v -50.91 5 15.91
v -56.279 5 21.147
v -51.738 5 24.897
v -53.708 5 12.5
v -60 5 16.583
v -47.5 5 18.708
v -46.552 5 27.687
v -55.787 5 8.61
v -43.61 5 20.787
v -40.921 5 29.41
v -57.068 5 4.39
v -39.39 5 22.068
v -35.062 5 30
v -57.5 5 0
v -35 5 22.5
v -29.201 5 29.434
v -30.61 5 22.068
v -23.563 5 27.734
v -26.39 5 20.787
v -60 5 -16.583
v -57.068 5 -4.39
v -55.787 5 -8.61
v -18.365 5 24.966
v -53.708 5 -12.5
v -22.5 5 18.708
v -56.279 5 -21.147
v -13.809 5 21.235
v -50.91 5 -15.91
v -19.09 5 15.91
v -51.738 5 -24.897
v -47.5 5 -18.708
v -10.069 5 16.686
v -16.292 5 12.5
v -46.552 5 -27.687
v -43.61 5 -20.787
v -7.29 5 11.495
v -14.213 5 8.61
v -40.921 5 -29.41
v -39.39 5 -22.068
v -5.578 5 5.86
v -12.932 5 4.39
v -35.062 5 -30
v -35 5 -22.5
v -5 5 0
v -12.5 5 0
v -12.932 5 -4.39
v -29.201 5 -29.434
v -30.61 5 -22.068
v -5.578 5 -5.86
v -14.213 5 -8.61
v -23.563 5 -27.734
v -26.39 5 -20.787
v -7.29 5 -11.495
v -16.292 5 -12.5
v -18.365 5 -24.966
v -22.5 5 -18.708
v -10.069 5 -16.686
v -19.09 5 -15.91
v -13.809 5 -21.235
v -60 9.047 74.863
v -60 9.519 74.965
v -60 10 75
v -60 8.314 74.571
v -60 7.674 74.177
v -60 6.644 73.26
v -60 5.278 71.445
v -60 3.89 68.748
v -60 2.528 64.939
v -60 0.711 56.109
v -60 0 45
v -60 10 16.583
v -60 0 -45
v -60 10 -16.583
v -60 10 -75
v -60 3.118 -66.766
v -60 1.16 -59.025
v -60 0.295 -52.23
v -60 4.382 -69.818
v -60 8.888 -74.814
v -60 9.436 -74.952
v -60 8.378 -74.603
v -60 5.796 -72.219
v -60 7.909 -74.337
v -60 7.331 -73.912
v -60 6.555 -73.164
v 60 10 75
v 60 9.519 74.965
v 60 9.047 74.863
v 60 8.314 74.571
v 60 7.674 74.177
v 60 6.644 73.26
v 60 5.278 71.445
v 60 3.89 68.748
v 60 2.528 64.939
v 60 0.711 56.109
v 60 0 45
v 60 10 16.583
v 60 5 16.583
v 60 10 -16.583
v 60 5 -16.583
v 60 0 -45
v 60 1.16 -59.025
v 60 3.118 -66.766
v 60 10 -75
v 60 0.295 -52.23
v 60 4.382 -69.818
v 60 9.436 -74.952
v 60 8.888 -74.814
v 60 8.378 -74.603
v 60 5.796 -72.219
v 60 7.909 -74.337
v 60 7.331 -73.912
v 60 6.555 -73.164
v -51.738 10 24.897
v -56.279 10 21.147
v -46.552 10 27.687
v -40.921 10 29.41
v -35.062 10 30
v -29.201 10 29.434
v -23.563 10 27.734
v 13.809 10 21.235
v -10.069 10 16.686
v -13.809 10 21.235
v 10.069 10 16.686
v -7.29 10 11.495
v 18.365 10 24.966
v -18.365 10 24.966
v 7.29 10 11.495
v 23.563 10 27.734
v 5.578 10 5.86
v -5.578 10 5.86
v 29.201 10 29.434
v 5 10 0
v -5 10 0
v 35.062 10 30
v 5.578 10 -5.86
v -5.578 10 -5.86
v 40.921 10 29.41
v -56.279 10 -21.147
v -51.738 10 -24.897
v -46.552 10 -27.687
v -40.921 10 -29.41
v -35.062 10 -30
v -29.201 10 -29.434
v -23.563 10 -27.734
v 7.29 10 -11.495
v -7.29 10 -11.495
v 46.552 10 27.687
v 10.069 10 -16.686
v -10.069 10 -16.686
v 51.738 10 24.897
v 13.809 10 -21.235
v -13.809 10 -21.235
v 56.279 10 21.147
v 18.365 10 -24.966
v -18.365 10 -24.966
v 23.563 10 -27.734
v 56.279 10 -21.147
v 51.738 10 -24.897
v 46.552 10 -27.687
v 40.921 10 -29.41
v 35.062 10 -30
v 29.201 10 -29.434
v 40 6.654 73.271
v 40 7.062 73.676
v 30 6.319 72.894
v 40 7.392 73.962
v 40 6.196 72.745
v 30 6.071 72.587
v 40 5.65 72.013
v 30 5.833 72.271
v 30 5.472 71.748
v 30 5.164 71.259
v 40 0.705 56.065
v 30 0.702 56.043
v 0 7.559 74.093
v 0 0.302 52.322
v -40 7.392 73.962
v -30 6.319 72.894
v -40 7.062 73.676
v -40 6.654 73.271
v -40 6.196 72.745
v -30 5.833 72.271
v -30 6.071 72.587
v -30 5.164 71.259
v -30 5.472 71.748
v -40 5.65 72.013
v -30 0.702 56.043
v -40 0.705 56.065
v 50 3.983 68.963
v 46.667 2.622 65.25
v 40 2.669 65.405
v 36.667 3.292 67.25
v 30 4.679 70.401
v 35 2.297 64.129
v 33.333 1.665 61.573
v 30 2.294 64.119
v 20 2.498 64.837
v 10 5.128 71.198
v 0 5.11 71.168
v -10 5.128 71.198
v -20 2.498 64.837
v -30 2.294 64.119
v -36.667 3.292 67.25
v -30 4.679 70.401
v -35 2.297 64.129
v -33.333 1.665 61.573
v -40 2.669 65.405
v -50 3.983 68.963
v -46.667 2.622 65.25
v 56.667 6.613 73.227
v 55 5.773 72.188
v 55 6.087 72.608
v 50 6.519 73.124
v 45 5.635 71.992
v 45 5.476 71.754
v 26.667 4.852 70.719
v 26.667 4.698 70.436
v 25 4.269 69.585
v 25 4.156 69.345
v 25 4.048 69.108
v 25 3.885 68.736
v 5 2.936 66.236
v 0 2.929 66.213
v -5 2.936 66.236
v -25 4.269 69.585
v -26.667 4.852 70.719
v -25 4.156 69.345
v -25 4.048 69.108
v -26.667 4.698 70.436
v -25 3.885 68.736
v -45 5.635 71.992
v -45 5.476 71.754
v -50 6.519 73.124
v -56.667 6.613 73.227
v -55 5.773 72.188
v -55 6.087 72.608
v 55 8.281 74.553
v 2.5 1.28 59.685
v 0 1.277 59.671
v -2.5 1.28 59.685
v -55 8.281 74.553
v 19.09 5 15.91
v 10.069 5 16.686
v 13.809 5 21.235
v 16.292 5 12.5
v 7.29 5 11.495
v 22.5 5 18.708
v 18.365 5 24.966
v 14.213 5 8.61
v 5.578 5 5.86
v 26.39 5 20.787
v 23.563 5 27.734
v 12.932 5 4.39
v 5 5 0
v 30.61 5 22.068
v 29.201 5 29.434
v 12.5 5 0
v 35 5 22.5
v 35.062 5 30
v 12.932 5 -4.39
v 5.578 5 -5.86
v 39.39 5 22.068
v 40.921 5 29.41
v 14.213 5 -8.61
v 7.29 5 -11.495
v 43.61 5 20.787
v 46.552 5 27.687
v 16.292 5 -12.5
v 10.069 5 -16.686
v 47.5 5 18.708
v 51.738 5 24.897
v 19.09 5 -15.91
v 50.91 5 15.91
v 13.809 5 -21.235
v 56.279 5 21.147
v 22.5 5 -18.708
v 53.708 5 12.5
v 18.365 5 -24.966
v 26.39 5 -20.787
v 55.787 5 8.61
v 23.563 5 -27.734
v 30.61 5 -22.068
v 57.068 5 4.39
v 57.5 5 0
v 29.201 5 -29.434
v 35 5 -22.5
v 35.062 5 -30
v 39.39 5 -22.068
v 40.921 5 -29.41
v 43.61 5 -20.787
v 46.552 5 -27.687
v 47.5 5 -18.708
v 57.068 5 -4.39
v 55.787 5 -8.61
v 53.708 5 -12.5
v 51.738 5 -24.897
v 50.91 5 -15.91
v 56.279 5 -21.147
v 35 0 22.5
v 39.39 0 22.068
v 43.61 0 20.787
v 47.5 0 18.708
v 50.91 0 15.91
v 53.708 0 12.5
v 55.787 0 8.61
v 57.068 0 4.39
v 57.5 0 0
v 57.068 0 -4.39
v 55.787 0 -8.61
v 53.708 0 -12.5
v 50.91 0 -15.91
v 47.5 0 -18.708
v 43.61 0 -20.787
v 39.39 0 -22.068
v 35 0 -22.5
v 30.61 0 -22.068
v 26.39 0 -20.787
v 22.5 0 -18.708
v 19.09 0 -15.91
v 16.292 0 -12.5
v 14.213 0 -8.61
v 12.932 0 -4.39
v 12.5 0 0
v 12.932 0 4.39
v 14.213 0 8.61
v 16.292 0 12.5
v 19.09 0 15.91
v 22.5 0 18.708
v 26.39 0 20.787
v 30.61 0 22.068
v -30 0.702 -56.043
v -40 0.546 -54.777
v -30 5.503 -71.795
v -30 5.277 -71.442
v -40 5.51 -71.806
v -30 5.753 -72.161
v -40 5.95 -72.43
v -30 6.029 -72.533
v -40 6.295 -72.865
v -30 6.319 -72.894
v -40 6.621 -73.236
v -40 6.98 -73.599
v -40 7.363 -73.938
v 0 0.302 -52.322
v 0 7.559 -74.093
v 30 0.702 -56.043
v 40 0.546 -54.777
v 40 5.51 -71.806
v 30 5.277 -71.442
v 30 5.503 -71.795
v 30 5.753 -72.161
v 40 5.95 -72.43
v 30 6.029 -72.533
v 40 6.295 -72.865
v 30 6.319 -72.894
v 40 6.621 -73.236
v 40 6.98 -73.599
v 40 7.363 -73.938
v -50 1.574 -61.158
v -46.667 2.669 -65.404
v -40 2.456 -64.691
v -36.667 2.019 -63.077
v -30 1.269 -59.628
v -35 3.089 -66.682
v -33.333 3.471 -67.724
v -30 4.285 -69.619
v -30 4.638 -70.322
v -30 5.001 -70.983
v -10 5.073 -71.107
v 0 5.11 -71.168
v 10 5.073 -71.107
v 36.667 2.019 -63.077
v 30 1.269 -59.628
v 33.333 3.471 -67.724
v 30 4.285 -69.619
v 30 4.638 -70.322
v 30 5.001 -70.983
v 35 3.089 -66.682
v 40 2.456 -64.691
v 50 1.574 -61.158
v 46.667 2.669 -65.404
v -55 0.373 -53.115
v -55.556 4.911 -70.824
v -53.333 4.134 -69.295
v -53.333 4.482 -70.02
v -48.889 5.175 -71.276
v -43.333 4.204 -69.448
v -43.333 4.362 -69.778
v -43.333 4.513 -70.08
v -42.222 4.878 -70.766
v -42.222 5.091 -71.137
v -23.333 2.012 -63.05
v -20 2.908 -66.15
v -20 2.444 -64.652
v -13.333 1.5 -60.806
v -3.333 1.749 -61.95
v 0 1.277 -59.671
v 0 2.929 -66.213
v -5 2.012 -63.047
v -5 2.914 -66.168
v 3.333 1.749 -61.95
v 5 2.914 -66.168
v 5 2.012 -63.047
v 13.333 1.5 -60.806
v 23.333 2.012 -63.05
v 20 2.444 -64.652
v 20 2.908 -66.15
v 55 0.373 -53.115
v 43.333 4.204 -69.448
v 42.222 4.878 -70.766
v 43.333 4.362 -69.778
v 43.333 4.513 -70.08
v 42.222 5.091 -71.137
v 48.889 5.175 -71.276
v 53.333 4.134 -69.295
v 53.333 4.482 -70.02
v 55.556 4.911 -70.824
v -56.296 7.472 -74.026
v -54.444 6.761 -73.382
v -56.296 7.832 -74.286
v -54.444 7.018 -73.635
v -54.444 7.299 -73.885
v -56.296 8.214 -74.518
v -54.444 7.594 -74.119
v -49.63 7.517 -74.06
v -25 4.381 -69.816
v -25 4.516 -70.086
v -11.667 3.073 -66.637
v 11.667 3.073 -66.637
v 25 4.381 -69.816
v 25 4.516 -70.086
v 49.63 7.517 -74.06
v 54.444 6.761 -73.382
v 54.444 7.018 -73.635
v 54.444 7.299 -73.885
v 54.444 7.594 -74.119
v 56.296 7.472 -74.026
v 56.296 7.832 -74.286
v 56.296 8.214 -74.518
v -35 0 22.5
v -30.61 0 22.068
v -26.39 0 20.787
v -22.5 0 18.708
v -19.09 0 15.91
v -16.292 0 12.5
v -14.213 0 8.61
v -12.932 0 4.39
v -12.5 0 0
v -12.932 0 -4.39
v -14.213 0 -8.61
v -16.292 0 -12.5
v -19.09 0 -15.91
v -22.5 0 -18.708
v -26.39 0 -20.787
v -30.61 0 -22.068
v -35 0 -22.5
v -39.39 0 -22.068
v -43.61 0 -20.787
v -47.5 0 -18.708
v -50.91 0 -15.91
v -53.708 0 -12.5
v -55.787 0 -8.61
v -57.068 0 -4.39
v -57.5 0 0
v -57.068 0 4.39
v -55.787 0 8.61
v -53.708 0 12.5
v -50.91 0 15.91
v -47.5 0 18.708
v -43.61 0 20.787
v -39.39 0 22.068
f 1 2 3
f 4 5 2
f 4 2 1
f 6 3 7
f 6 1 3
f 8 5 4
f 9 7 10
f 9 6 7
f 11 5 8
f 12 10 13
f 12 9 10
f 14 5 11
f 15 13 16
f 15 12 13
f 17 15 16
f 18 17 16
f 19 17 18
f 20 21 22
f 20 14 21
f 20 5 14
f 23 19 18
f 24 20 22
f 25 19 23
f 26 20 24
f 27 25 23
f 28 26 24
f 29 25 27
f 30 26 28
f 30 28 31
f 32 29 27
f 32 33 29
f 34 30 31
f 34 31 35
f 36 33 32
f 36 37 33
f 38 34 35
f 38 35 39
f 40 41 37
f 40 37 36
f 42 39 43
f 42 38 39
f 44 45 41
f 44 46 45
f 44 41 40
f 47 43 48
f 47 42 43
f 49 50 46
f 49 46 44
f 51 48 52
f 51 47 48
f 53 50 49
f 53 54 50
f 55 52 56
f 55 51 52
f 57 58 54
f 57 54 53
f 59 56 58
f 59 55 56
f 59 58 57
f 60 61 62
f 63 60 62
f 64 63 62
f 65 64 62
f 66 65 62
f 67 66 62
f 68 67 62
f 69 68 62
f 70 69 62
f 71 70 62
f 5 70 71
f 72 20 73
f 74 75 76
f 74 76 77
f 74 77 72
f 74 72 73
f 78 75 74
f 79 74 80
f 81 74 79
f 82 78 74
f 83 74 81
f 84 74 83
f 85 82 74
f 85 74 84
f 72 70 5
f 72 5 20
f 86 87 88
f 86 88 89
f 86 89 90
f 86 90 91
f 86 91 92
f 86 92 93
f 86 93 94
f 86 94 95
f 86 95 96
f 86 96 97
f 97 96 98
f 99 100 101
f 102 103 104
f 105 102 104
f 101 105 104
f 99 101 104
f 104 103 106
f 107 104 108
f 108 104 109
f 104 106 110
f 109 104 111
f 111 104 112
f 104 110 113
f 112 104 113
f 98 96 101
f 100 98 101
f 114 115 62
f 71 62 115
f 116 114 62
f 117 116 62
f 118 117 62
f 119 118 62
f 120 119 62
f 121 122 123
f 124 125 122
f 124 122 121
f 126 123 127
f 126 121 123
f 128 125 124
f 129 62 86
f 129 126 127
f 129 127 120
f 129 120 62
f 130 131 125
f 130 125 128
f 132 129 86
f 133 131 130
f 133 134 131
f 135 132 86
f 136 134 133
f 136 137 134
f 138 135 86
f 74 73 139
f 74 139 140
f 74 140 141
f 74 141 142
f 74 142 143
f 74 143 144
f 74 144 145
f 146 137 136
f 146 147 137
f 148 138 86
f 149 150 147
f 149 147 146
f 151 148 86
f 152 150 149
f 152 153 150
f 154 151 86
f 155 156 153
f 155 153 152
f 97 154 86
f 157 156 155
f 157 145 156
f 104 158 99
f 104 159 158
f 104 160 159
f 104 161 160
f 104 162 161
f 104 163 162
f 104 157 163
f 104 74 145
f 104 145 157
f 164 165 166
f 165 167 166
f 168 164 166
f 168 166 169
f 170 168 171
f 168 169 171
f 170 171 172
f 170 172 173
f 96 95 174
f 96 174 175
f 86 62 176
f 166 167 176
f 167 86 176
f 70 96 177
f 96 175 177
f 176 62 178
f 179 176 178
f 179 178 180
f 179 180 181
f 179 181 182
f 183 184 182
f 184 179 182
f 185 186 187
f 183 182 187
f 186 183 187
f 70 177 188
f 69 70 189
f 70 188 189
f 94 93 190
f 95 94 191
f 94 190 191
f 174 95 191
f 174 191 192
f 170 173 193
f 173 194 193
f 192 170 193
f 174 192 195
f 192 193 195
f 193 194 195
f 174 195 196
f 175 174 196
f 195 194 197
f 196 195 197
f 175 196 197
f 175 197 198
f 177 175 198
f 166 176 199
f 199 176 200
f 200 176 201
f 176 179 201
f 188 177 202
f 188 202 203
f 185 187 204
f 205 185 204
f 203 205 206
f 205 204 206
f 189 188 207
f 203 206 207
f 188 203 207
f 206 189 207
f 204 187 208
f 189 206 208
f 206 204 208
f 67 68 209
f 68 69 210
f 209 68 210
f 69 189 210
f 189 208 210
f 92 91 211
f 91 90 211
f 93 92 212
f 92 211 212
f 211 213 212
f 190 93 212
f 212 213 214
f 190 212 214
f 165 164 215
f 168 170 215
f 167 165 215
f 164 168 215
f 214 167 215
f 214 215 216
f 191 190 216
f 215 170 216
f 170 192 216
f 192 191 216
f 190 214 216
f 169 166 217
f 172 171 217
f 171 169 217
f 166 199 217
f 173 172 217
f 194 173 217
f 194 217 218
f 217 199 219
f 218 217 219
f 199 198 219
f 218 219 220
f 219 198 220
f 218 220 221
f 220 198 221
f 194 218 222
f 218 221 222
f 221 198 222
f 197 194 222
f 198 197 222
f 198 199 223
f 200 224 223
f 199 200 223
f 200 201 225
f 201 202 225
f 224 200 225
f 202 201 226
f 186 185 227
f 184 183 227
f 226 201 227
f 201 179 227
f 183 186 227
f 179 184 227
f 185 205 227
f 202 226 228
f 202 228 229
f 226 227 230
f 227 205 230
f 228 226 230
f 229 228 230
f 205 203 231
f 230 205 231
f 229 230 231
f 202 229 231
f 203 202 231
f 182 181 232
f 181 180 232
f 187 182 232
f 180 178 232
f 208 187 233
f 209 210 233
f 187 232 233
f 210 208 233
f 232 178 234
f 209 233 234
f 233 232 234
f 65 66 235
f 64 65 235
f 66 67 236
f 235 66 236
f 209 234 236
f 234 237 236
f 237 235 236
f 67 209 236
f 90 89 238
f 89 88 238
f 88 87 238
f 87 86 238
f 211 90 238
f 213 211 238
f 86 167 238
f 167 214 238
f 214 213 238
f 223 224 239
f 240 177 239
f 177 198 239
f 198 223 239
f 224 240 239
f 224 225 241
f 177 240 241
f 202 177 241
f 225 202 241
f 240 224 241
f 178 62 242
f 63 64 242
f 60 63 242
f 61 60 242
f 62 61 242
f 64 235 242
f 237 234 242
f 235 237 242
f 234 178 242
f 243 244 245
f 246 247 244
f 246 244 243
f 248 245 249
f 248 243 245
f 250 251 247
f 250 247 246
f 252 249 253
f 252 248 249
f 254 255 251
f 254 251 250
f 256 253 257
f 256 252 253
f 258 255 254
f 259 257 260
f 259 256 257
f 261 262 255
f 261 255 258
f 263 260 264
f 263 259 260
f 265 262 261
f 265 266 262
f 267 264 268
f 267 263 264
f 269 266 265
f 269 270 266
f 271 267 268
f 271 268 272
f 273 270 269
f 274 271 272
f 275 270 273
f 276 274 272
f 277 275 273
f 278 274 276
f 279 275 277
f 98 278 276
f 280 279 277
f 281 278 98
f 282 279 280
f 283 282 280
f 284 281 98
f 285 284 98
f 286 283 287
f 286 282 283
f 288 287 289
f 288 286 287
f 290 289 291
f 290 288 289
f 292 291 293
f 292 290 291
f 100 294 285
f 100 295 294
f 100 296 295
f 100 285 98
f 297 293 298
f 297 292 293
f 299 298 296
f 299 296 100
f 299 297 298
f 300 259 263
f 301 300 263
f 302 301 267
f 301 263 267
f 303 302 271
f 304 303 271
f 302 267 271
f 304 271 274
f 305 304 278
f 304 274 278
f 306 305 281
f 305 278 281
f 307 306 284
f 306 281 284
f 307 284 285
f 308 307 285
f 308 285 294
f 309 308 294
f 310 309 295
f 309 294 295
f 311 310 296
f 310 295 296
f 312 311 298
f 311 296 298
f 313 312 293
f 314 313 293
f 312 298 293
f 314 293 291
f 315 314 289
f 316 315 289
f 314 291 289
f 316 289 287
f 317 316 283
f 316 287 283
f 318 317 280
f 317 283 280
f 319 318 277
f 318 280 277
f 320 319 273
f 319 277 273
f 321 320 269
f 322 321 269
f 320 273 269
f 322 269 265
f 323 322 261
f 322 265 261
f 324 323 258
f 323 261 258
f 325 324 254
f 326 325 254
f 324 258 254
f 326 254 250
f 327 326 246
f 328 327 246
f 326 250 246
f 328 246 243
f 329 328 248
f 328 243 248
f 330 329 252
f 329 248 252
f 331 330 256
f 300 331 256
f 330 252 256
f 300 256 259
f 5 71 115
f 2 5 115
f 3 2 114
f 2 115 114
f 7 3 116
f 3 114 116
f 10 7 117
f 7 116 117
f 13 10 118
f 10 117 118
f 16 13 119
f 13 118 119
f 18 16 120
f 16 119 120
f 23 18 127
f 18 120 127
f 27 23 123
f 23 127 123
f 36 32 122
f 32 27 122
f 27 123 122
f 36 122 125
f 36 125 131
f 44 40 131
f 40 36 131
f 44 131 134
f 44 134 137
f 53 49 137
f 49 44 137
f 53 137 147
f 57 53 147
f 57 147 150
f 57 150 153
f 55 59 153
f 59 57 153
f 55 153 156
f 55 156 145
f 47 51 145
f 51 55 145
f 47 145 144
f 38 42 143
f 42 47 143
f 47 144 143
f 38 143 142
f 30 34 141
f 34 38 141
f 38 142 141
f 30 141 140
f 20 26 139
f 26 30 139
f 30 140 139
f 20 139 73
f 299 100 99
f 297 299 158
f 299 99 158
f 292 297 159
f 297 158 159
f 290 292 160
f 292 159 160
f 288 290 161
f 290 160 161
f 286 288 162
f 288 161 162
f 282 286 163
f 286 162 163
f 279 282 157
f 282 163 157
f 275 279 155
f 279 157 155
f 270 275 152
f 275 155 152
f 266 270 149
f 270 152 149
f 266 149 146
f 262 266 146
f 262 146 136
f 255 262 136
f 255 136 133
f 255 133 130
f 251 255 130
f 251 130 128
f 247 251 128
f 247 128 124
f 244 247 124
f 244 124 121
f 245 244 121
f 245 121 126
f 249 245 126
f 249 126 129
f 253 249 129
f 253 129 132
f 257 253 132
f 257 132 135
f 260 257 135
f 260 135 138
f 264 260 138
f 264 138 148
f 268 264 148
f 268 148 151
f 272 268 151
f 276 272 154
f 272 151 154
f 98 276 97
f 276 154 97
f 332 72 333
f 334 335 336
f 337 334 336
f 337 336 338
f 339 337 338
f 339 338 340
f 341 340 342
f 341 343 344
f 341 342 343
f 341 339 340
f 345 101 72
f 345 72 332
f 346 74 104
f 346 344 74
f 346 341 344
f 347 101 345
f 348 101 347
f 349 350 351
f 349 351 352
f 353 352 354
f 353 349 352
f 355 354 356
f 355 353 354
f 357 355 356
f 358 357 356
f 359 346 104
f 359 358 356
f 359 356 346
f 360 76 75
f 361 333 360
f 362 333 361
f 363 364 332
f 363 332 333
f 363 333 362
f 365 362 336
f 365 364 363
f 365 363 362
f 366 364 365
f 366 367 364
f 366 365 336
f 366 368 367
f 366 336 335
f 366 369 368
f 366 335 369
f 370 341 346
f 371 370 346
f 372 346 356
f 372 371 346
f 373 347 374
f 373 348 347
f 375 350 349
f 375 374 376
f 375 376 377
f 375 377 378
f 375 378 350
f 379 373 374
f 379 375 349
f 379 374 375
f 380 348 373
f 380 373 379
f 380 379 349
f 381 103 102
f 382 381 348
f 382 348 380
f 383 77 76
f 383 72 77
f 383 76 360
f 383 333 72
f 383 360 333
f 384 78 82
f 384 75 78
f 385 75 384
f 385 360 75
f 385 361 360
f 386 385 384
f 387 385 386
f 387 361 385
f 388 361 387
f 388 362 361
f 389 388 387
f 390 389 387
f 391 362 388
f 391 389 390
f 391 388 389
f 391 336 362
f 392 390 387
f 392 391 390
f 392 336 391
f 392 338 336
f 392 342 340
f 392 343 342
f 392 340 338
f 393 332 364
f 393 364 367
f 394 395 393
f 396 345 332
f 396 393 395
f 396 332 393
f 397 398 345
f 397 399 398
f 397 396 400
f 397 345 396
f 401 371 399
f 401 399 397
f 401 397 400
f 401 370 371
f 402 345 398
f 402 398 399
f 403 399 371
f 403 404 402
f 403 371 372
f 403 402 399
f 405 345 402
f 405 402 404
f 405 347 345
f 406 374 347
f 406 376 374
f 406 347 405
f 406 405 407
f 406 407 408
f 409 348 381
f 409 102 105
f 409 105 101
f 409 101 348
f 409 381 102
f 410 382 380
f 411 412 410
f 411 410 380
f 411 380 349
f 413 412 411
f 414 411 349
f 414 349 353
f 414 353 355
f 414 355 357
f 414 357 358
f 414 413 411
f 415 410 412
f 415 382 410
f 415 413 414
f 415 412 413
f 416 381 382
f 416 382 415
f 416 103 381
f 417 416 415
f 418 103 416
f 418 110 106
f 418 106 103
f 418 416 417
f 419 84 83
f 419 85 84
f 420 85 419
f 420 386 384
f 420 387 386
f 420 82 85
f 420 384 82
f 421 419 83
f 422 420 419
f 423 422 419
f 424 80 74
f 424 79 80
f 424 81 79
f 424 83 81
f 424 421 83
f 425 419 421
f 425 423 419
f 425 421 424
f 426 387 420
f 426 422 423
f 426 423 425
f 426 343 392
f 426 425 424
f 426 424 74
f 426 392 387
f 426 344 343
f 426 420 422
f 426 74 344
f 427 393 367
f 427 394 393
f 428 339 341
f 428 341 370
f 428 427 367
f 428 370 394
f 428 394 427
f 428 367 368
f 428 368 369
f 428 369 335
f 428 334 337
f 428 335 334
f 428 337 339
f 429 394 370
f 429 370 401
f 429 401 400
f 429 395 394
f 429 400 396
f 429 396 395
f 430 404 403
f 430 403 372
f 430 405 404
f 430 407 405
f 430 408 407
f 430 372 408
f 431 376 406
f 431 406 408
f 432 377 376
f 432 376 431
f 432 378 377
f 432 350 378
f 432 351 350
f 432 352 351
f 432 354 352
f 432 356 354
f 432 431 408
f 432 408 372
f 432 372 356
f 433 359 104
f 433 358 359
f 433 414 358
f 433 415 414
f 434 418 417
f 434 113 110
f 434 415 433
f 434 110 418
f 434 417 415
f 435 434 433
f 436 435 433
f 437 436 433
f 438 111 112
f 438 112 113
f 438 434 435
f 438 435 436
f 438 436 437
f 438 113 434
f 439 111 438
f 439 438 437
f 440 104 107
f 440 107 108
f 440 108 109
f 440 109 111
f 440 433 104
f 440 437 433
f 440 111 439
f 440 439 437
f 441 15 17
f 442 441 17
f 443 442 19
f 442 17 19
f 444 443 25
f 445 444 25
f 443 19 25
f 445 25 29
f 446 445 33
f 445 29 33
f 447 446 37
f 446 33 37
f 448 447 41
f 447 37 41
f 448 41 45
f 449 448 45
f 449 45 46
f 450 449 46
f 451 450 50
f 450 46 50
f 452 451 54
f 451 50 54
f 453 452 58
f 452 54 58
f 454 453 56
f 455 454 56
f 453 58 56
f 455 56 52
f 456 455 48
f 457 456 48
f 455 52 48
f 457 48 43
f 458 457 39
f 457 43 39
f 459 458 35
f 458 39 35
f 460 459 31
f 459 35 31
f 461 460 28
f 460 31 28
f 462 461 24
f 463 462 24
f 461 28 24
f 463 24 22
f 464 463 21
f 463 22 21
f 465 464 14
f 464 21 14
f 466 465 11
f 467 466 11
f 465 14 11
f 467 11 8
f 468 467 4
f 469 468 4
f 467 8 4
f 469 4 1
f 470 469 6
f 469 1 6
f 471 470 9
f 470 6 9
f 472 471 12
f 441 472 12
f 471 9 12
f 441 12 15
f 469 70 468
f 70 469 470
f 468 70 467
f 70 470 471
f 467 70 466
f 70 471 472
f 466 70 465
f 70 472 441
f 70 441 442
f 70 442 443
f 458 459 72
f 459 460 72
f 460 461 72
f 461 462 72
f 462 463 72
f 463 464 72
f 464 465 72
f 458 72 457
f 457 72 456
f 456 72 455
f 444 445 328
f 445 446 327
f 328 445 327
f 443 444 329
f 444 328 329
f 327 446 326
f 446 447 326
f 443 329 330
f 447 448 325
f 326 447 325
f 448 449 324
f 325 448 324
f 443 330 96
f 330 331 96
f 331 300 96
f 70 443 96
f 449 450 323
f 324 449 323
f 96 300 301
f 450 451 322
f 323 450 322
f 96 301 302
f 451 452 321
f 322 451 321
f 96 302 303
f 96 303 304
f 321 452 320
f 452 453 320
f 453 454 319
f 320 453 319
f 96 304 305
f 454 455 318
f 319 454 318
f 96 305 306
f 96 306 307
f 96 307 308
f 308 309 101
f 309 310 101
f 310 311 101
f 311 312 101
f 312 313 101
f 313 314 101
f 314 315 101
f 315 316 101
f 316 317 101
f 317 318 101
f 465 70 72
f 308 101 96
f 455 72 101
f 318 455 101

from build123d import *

# Parameters (mm, degrees)
SKETCH2_W           = 120
SKETCH2_H           = 150
BOSS_EXTRUDE1_DEPTH = 10
SKETCH3_R           = 30
CUT_EXTRUDE1_DEPTH  = 5
SKETCH4_R           = 22.5
CUT_EXTRUDE2_DEPTH  = 5
FILLET1_SIZE        = 30
FILLET1_SIZE_2      = 10


with BuildPart() as part:
    # Sketch2 → Boss-Extrude1 (new body)
    with BuildSketch(Plane(origin=(0, 0, 0), x_dir=(1, 0, 0), z_dir=(0, 1, 0))):
        Rectangle(SKETCH2_W, SKETCH2_H)
    extrude(amount=BOSS_EXTRUDE1_DEPTH)

    # Sketch3 → Cut-Extrude1 (cut)
    with BuildSketch(Plane(origin=(0, 10, 0), x_dir=(1, 0, 0), z_dir=(0, 1, 0))):
        with Locations((35, 0)):
            Circle(SKETCH3_R)
        with Locations((-35, 0)):
            Circle(SKETCH3_R)
    extrude(amount=-CUT_EXTRUDE1_DEPTH, mode=Mode.SUBTRACT)

    # Sketch4 → Cut-Extrude2 (cut)
    with BuildSketch(Plane(origin=(0, 5, 0), x_dir=(1, 0, 0), z_dir=(0, 1, 0))):
        with Locations(Location((-35, 0, 0), (0, 0, 270))):
            Circle(SKETCH4_R)
        with Locations(Location((35, 0, 0), (0, 0, 270))):
            Circle(SKETCH4_R)
    extrude(amount=-CUT_EXTRUDE2_DEPTH, mode=Mode.SUBTRACT)

    # Fillet1
    # an asymmetric fillet: 30, 10 mm, written as the material it takes off along each edge
    with BuildSketch(Plane(origin=(135, 0, -75), x_dir=(0, 0, 1), z_dir=(-1, 0, 0))) as fillet1_piece_1:
        with BuildLine():
            Bezier((FILLET1_SIZE, 0), (0, 0), (0, FILLET1_SIZE_2), weights=[1, 0.707106781, 1])
            Line((0, FILLET1_SIZE_2), (0, 0))
            Line((0, 0), (FILLET1_SIZE, 0))
        make_face()
    extrude(amount=270, mode=Mode.SUBTRACT)
    with BuildSketch(Plane(origin=(-135, 0, 75), x_dir=(0, 1, 0), z_dir=(1, 0, 0))) as fillet1_piece_2:
        with BuildLine():
            Bezier((FILLET1_SIZE_2, 0), (0, 0), (0, -FILLET1_SIZE), weights=[1, 0.707106781, 1])
            Line((0, -FILLET1_SIZE), (0, 0))
            Line((0, 0), (FILLET1_SIZE_2, 0))
        make_face()
    extrude(amount=270, mode=Mode.SUBTRACT)


solid = part.part
